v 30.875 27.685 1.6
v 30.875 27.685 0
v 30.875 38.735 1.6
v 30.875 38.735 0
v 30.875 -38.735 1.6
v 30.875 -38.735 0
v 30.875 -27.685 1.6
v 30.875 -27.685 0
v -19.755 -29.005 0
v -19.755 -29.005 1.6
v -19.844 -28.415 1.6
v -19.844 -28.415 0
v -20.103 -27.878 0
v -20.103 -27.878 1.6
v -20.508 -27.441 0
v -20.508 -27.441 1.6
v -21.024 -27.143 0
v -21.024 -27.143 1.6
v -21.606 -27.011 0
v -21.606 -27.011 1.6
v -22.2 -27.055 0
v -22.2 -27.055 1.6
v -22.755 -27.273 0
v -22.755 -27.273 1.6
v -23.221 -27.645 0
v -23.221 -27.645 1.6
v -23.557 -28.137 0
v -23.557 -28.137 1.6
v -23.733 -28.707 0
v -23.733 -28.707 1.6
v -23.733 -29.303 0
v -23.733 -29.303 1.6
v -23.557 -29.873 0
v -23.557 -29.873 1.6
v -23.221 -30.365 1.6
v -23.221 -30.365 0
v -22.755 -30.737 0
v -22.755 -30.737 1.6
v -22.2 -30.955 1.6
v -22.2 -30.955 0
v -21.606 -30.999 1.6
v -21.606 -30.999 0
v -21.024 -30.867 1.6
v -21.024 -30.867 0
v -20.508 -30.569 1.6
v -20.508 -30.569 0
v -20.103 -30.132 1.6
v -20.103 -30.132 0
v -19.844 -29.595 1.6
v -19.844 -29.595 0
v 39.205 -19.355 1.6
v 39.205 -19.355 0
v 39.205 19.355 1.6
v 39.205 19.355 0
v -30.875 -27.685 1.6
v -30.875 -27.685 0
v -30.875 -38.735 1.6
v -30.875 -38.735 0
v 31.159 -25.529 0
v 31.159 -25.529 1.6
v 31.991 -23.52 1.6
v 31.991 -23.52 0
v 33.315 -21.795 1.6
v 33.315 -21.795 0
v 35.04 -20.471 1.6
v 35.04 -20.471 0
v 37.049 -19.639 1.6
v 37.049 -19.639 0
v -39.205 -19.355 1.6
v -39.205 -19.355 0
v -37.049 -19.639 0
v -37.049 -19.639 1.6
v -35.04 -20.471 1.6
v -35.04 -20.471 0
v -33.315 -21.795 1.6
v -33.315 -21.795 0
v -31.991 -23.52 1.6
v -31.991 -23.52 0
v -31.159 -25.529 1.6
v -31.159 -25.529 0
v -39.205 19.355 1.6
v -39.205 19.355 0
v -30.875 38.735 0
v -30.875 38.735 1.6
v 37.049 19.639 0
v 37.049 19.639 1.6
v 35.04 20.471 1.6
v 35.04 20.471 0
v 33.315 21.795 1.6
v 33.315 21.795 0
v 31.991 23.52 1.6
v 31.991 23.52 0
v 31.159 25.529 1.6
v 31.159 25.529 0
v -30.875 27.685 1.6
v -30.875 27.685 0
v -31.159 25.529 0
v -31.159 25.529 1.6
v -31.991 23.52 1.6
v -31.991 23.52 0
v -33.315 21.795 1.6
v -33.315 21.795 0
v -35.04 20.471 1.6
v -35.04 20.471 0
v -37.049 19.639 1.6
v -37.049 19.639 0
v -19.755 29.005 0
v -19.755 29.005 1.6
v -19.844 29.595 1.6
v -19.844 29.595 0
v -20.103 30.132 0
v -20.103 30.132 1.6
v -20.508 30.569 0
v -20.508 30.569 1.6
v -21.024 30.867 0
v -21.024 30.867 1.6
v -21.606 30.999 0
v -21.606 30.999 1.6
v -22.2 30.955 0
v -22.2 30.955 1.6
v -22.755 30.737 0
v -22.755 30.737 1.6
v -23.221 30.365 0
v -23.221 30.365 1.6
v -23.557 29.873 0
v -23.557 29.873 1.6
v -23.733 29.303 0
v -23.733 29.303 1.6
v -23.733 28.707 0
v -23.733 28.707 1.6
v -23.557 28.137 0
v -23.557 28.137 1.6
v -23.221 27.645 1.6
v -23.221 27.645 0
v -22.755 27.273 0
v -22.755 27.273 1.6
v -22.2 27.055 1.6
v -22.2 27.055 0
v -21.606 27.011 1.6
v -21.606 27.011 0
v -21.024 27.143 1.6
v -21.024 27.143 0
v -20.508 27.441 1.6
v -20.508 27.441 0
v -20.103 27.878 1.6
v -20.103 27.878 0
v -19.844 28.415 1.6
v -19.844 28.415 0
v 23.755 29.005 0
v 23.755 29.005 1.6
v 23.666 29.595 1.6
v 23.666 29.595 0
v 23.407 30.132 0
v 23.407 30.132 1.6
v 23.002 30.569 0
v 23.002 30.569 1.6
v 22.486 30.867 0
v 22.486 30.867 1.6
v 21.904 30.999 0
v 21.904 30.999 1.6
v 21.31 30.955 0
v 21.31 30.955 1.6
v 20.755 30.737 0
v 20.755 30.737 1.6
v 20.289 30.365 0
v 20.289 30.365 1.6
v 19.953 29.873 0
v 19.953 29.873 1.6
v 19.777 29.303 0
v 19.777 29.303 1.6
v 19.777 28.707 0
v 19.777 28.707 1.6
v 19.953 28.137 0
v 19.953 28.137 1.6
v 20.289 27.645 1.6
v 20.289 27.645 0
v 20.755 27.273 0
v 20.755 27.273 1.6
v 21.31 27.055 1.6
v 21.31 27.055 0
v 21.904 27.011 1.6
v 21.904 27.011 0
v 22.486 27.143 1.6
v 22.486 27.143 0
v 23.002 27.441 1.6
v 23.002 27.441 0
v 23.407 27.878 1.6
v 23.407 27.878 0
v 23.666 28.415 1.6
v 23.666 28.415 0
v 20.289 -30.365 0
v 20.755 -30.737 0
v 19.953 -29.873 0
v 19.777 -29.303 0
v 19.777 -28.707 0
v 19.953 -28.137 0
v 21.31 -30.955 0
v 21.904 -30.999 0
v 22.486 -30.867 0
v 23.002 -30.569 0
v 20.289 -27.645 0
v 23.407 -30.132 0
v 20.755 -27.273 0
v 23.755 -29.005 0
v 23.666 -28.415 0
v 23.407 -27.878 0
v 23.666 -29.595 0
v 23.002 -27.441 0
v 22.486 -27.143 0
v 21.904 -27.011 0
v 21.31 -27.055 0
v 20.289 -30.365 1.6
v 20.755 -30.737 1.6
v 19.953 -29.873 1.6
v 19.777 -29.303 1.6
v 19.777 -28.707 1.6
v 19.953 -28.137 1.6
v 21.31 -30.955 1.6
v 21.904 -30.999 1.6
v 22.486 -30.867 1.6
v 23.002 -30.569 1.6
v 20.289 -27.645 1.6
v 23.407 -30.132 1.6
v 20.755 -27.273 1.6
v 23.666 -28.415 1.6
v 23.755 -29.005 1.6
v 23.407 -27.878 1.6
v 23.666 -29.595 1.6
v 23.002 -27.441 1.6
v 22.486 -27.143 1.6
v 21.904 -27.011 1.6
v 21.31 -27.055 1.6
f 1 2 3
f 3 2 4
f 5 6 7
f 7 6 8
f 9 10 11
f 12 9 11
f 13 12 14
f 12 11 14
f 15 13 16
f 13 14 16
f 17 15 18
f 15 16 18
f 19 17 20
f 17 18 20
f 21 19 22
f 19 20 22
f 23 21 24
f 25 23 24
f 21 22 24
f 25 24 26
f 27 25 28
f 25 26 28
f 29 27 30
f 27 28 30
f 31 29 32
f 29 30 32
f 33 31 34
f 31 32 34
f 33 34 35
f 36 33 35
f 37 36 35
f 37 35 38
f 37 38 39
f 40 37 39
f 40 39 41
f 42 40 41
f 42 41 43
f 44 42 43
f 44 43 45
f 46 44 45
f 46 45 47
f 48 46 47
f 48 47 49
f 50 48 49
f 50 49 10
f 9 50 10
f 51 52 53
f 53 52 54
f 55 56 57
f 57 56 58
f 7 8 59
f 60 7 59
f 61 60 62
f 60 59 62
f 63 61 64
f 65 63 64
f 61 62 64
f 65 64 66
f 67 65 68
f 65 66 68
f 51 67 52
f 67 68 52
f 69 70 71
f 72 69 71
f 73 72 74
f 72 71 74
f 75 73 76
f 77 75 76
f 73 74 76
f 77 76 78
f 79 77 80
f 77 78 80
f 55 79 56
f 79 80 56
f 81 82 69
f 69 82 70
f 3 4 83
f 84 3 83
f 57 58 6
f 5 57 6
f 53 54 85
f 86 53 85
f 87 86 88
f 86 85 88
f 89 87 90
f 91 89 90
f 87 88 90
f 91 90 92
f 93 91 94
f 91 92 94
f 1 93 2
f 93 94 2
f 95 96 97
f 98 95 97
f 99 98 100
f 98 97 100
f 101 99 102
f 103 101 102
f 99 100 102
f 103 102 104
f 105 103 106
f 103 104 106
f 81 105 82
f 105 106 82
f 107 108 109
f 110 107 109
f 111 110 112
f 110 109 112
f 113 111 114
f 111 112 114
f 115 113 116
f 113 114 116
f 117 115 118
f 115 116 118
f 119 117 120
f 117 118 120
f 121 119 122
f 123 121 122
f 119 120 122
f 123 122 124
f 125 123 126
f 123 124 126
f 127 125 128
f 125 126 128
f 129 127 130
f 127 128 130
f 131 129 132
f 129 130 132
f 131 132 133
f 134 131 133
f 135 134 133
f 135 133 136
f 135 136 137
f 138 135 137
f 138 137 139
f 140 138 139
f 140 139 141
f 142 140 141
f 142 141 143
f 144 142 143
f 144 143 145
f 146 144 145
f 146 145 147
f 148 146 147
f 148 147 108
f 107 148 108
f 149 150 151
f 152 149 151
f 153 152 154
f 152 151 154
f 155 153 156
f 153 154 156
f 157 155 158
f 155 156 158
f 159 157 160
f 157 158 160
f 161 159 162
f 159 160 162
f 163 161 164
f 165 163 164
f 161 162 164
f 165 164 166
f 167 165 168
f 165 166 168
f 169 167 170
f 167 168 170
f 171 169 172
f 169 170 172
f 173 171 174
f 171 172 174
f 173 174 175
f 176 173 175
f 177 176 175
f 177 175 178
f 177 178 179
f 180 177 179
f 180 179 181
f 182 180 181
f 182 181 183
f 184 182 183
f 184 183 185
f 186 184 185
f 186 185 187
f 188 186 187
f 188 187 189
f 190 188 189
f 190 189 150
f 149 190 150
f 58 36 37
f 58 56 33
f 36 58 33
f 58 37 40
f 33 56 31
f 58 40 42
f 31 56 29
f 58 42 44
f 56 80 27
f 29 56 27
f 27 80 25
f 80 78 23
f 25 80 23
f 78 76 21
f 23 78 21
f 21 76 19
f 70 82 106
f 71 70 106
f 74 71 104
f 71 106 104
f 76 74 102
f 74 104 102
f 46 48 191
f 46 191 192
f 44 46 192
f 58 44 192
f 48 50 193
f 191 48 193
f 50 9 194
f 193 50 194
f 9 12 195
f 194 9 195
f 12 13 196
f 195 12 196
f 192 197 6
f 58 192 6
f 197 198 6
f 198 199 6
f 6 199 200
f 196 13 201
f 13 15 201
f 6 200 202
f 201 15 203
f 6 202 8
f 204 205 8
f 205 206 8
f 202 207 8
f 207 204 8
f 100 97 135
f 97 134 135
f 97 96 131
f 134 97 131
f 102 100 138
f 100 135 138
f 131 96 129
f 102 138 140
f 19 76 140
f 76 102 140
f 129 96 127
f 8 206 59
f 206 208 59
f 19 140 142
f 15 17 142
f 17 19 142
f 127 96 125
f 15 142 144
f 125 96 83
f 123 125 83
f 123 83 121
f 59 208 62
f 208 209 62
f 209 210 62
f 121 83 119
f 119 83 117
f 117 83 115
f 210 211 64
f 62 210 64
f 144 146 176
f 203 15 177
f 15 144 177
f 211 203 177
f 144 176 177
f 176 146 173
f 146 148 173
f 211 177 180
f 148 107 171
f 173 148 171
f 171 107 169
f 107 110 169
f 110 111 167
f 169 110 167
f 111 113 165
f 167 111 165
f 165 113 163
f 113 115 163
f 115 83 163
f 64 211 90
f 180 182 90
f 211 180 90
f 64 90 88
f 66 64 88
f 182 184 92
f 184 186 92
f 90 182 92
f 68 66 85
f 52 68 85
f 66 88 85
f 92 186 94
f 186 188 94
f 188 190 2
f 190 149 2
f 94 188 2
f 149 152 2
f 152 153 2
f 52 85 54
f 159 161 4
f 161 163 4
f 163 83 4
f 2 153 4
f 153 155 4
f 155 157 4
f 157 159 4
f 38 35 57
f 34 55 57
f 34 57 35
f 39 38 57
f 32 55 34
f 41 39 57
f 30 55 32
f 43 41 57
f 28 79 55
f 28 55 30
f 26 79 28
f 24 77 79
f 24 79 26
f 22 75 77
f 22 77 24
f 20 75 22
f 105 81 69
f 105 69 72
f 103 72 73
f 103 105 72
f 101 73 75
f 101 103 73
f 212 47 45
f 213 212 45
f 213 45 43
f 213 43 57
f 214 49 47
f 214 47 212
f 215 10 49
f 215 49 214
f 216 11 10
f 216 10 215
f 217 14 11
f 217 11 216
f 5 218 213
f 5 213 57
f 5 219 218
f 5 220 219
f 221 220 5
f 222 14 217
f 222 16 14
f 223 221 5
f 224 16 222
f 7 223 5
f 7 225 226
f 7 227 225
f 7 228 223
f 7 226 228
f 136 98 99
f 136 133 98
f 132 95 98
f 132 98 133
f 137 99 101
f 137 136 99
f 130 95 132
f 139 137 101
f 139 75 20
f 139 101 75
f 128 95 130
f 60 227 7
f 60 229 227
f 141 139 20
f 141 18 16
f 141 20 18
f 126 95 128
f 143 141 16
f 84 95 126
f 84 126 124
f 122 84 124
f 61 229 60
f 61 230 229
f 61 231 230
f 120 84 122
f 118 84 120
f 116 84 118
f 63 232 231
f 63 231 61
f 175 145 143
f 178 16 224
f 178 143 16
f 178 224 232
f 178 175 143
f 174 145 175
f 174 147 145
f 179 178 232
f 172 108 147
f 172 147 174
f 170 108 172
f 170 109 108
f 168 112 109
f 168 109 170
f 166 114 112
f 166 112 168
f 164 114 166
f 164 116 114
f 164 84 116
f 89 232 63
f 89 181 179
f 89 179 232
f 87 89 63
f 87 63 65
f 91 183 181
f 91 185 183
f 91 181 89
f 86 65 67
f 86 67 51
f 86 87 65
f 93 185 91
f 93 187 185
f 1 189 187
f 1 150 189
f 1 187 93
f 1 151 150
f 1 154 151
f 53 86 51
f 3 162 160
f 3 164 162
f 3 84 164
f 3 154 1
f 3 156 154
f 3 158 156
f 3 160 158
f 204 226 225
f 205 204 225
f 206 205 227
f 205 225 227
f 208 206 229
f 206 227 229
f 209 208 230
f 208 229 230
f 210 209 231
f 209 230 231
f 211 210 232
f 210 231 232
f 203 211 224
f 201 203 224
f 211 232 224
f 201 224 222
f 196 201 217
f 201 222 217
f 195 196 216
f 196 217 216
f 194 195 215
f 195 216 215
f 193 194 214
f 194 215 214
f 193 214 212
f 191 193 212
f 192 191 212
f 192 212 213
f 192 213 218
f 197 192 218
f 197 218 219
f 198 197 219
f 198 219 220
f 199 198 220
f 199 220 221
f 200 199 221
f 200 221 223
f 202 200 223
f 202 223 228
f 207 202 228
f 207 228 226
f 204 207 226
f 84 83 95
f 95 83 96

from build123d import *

# Parameters (mm, degrees)
F1_DEPTH = 1.6
F2_R     = 2
F3_DEPTH = 25


with BuildPart() as f1:
    # F0 (on Top) → F1 (new body)
    with BuildSketch(Plane.XY):
        with BuildLine():
            Line((30.875, 38.735), (-30.875, 38.735))
            Line((-30.875, 38.735), (-30.875, 27.685))
            ThreePointArc((-30.875, 27.685), (-33.314801, 21.794801), (-39.205, 19.355))
            Line((-39.205, 19.355), (-39.205, -19.355))
            ThreePointArc((-39.205, -19.355), (-33.314801, -21.794801), (-30.875, -27.685))
            Line((-30.875, -27.685), (-30.875, -38.735))
            Line((-30.875, -38.735), (30.875, -38.735))
            Line((30.875, -38.735), (30.875, -27.685))
            ThreePointArc((30.875, -27.685), (33.314801, -21.794801), (39.205, -19.355))
            Line((39.205, -19.355), (39.205, 19.355))
            ThreePointArc((39.205, 19.355), (33.314801, 21.794801), (30.875, 27.685))
            Line((30.875, 27.685), (30.875, 38.735))
        make_face()
    extrude(amount=F1_DEPTH)

    # F2 (on face) → F3 (cut)
    with BuildSketch(Plane.XY.offset(1.6)):
        with Locations((-21.755, 29.005)):
            Circle(F2_R)
        with Locations((21.755, 29.005)):
            Circle(F2_R)
        with Locations((-21.755, -29.005)):
            Circle(F2_R)
        with Locations((21.755, -29.005)):
            Circle(F2_R)
    extrude(amount=-F3_DEPTH, mode=Mode.SUBTRACT)


solid = f1.part
